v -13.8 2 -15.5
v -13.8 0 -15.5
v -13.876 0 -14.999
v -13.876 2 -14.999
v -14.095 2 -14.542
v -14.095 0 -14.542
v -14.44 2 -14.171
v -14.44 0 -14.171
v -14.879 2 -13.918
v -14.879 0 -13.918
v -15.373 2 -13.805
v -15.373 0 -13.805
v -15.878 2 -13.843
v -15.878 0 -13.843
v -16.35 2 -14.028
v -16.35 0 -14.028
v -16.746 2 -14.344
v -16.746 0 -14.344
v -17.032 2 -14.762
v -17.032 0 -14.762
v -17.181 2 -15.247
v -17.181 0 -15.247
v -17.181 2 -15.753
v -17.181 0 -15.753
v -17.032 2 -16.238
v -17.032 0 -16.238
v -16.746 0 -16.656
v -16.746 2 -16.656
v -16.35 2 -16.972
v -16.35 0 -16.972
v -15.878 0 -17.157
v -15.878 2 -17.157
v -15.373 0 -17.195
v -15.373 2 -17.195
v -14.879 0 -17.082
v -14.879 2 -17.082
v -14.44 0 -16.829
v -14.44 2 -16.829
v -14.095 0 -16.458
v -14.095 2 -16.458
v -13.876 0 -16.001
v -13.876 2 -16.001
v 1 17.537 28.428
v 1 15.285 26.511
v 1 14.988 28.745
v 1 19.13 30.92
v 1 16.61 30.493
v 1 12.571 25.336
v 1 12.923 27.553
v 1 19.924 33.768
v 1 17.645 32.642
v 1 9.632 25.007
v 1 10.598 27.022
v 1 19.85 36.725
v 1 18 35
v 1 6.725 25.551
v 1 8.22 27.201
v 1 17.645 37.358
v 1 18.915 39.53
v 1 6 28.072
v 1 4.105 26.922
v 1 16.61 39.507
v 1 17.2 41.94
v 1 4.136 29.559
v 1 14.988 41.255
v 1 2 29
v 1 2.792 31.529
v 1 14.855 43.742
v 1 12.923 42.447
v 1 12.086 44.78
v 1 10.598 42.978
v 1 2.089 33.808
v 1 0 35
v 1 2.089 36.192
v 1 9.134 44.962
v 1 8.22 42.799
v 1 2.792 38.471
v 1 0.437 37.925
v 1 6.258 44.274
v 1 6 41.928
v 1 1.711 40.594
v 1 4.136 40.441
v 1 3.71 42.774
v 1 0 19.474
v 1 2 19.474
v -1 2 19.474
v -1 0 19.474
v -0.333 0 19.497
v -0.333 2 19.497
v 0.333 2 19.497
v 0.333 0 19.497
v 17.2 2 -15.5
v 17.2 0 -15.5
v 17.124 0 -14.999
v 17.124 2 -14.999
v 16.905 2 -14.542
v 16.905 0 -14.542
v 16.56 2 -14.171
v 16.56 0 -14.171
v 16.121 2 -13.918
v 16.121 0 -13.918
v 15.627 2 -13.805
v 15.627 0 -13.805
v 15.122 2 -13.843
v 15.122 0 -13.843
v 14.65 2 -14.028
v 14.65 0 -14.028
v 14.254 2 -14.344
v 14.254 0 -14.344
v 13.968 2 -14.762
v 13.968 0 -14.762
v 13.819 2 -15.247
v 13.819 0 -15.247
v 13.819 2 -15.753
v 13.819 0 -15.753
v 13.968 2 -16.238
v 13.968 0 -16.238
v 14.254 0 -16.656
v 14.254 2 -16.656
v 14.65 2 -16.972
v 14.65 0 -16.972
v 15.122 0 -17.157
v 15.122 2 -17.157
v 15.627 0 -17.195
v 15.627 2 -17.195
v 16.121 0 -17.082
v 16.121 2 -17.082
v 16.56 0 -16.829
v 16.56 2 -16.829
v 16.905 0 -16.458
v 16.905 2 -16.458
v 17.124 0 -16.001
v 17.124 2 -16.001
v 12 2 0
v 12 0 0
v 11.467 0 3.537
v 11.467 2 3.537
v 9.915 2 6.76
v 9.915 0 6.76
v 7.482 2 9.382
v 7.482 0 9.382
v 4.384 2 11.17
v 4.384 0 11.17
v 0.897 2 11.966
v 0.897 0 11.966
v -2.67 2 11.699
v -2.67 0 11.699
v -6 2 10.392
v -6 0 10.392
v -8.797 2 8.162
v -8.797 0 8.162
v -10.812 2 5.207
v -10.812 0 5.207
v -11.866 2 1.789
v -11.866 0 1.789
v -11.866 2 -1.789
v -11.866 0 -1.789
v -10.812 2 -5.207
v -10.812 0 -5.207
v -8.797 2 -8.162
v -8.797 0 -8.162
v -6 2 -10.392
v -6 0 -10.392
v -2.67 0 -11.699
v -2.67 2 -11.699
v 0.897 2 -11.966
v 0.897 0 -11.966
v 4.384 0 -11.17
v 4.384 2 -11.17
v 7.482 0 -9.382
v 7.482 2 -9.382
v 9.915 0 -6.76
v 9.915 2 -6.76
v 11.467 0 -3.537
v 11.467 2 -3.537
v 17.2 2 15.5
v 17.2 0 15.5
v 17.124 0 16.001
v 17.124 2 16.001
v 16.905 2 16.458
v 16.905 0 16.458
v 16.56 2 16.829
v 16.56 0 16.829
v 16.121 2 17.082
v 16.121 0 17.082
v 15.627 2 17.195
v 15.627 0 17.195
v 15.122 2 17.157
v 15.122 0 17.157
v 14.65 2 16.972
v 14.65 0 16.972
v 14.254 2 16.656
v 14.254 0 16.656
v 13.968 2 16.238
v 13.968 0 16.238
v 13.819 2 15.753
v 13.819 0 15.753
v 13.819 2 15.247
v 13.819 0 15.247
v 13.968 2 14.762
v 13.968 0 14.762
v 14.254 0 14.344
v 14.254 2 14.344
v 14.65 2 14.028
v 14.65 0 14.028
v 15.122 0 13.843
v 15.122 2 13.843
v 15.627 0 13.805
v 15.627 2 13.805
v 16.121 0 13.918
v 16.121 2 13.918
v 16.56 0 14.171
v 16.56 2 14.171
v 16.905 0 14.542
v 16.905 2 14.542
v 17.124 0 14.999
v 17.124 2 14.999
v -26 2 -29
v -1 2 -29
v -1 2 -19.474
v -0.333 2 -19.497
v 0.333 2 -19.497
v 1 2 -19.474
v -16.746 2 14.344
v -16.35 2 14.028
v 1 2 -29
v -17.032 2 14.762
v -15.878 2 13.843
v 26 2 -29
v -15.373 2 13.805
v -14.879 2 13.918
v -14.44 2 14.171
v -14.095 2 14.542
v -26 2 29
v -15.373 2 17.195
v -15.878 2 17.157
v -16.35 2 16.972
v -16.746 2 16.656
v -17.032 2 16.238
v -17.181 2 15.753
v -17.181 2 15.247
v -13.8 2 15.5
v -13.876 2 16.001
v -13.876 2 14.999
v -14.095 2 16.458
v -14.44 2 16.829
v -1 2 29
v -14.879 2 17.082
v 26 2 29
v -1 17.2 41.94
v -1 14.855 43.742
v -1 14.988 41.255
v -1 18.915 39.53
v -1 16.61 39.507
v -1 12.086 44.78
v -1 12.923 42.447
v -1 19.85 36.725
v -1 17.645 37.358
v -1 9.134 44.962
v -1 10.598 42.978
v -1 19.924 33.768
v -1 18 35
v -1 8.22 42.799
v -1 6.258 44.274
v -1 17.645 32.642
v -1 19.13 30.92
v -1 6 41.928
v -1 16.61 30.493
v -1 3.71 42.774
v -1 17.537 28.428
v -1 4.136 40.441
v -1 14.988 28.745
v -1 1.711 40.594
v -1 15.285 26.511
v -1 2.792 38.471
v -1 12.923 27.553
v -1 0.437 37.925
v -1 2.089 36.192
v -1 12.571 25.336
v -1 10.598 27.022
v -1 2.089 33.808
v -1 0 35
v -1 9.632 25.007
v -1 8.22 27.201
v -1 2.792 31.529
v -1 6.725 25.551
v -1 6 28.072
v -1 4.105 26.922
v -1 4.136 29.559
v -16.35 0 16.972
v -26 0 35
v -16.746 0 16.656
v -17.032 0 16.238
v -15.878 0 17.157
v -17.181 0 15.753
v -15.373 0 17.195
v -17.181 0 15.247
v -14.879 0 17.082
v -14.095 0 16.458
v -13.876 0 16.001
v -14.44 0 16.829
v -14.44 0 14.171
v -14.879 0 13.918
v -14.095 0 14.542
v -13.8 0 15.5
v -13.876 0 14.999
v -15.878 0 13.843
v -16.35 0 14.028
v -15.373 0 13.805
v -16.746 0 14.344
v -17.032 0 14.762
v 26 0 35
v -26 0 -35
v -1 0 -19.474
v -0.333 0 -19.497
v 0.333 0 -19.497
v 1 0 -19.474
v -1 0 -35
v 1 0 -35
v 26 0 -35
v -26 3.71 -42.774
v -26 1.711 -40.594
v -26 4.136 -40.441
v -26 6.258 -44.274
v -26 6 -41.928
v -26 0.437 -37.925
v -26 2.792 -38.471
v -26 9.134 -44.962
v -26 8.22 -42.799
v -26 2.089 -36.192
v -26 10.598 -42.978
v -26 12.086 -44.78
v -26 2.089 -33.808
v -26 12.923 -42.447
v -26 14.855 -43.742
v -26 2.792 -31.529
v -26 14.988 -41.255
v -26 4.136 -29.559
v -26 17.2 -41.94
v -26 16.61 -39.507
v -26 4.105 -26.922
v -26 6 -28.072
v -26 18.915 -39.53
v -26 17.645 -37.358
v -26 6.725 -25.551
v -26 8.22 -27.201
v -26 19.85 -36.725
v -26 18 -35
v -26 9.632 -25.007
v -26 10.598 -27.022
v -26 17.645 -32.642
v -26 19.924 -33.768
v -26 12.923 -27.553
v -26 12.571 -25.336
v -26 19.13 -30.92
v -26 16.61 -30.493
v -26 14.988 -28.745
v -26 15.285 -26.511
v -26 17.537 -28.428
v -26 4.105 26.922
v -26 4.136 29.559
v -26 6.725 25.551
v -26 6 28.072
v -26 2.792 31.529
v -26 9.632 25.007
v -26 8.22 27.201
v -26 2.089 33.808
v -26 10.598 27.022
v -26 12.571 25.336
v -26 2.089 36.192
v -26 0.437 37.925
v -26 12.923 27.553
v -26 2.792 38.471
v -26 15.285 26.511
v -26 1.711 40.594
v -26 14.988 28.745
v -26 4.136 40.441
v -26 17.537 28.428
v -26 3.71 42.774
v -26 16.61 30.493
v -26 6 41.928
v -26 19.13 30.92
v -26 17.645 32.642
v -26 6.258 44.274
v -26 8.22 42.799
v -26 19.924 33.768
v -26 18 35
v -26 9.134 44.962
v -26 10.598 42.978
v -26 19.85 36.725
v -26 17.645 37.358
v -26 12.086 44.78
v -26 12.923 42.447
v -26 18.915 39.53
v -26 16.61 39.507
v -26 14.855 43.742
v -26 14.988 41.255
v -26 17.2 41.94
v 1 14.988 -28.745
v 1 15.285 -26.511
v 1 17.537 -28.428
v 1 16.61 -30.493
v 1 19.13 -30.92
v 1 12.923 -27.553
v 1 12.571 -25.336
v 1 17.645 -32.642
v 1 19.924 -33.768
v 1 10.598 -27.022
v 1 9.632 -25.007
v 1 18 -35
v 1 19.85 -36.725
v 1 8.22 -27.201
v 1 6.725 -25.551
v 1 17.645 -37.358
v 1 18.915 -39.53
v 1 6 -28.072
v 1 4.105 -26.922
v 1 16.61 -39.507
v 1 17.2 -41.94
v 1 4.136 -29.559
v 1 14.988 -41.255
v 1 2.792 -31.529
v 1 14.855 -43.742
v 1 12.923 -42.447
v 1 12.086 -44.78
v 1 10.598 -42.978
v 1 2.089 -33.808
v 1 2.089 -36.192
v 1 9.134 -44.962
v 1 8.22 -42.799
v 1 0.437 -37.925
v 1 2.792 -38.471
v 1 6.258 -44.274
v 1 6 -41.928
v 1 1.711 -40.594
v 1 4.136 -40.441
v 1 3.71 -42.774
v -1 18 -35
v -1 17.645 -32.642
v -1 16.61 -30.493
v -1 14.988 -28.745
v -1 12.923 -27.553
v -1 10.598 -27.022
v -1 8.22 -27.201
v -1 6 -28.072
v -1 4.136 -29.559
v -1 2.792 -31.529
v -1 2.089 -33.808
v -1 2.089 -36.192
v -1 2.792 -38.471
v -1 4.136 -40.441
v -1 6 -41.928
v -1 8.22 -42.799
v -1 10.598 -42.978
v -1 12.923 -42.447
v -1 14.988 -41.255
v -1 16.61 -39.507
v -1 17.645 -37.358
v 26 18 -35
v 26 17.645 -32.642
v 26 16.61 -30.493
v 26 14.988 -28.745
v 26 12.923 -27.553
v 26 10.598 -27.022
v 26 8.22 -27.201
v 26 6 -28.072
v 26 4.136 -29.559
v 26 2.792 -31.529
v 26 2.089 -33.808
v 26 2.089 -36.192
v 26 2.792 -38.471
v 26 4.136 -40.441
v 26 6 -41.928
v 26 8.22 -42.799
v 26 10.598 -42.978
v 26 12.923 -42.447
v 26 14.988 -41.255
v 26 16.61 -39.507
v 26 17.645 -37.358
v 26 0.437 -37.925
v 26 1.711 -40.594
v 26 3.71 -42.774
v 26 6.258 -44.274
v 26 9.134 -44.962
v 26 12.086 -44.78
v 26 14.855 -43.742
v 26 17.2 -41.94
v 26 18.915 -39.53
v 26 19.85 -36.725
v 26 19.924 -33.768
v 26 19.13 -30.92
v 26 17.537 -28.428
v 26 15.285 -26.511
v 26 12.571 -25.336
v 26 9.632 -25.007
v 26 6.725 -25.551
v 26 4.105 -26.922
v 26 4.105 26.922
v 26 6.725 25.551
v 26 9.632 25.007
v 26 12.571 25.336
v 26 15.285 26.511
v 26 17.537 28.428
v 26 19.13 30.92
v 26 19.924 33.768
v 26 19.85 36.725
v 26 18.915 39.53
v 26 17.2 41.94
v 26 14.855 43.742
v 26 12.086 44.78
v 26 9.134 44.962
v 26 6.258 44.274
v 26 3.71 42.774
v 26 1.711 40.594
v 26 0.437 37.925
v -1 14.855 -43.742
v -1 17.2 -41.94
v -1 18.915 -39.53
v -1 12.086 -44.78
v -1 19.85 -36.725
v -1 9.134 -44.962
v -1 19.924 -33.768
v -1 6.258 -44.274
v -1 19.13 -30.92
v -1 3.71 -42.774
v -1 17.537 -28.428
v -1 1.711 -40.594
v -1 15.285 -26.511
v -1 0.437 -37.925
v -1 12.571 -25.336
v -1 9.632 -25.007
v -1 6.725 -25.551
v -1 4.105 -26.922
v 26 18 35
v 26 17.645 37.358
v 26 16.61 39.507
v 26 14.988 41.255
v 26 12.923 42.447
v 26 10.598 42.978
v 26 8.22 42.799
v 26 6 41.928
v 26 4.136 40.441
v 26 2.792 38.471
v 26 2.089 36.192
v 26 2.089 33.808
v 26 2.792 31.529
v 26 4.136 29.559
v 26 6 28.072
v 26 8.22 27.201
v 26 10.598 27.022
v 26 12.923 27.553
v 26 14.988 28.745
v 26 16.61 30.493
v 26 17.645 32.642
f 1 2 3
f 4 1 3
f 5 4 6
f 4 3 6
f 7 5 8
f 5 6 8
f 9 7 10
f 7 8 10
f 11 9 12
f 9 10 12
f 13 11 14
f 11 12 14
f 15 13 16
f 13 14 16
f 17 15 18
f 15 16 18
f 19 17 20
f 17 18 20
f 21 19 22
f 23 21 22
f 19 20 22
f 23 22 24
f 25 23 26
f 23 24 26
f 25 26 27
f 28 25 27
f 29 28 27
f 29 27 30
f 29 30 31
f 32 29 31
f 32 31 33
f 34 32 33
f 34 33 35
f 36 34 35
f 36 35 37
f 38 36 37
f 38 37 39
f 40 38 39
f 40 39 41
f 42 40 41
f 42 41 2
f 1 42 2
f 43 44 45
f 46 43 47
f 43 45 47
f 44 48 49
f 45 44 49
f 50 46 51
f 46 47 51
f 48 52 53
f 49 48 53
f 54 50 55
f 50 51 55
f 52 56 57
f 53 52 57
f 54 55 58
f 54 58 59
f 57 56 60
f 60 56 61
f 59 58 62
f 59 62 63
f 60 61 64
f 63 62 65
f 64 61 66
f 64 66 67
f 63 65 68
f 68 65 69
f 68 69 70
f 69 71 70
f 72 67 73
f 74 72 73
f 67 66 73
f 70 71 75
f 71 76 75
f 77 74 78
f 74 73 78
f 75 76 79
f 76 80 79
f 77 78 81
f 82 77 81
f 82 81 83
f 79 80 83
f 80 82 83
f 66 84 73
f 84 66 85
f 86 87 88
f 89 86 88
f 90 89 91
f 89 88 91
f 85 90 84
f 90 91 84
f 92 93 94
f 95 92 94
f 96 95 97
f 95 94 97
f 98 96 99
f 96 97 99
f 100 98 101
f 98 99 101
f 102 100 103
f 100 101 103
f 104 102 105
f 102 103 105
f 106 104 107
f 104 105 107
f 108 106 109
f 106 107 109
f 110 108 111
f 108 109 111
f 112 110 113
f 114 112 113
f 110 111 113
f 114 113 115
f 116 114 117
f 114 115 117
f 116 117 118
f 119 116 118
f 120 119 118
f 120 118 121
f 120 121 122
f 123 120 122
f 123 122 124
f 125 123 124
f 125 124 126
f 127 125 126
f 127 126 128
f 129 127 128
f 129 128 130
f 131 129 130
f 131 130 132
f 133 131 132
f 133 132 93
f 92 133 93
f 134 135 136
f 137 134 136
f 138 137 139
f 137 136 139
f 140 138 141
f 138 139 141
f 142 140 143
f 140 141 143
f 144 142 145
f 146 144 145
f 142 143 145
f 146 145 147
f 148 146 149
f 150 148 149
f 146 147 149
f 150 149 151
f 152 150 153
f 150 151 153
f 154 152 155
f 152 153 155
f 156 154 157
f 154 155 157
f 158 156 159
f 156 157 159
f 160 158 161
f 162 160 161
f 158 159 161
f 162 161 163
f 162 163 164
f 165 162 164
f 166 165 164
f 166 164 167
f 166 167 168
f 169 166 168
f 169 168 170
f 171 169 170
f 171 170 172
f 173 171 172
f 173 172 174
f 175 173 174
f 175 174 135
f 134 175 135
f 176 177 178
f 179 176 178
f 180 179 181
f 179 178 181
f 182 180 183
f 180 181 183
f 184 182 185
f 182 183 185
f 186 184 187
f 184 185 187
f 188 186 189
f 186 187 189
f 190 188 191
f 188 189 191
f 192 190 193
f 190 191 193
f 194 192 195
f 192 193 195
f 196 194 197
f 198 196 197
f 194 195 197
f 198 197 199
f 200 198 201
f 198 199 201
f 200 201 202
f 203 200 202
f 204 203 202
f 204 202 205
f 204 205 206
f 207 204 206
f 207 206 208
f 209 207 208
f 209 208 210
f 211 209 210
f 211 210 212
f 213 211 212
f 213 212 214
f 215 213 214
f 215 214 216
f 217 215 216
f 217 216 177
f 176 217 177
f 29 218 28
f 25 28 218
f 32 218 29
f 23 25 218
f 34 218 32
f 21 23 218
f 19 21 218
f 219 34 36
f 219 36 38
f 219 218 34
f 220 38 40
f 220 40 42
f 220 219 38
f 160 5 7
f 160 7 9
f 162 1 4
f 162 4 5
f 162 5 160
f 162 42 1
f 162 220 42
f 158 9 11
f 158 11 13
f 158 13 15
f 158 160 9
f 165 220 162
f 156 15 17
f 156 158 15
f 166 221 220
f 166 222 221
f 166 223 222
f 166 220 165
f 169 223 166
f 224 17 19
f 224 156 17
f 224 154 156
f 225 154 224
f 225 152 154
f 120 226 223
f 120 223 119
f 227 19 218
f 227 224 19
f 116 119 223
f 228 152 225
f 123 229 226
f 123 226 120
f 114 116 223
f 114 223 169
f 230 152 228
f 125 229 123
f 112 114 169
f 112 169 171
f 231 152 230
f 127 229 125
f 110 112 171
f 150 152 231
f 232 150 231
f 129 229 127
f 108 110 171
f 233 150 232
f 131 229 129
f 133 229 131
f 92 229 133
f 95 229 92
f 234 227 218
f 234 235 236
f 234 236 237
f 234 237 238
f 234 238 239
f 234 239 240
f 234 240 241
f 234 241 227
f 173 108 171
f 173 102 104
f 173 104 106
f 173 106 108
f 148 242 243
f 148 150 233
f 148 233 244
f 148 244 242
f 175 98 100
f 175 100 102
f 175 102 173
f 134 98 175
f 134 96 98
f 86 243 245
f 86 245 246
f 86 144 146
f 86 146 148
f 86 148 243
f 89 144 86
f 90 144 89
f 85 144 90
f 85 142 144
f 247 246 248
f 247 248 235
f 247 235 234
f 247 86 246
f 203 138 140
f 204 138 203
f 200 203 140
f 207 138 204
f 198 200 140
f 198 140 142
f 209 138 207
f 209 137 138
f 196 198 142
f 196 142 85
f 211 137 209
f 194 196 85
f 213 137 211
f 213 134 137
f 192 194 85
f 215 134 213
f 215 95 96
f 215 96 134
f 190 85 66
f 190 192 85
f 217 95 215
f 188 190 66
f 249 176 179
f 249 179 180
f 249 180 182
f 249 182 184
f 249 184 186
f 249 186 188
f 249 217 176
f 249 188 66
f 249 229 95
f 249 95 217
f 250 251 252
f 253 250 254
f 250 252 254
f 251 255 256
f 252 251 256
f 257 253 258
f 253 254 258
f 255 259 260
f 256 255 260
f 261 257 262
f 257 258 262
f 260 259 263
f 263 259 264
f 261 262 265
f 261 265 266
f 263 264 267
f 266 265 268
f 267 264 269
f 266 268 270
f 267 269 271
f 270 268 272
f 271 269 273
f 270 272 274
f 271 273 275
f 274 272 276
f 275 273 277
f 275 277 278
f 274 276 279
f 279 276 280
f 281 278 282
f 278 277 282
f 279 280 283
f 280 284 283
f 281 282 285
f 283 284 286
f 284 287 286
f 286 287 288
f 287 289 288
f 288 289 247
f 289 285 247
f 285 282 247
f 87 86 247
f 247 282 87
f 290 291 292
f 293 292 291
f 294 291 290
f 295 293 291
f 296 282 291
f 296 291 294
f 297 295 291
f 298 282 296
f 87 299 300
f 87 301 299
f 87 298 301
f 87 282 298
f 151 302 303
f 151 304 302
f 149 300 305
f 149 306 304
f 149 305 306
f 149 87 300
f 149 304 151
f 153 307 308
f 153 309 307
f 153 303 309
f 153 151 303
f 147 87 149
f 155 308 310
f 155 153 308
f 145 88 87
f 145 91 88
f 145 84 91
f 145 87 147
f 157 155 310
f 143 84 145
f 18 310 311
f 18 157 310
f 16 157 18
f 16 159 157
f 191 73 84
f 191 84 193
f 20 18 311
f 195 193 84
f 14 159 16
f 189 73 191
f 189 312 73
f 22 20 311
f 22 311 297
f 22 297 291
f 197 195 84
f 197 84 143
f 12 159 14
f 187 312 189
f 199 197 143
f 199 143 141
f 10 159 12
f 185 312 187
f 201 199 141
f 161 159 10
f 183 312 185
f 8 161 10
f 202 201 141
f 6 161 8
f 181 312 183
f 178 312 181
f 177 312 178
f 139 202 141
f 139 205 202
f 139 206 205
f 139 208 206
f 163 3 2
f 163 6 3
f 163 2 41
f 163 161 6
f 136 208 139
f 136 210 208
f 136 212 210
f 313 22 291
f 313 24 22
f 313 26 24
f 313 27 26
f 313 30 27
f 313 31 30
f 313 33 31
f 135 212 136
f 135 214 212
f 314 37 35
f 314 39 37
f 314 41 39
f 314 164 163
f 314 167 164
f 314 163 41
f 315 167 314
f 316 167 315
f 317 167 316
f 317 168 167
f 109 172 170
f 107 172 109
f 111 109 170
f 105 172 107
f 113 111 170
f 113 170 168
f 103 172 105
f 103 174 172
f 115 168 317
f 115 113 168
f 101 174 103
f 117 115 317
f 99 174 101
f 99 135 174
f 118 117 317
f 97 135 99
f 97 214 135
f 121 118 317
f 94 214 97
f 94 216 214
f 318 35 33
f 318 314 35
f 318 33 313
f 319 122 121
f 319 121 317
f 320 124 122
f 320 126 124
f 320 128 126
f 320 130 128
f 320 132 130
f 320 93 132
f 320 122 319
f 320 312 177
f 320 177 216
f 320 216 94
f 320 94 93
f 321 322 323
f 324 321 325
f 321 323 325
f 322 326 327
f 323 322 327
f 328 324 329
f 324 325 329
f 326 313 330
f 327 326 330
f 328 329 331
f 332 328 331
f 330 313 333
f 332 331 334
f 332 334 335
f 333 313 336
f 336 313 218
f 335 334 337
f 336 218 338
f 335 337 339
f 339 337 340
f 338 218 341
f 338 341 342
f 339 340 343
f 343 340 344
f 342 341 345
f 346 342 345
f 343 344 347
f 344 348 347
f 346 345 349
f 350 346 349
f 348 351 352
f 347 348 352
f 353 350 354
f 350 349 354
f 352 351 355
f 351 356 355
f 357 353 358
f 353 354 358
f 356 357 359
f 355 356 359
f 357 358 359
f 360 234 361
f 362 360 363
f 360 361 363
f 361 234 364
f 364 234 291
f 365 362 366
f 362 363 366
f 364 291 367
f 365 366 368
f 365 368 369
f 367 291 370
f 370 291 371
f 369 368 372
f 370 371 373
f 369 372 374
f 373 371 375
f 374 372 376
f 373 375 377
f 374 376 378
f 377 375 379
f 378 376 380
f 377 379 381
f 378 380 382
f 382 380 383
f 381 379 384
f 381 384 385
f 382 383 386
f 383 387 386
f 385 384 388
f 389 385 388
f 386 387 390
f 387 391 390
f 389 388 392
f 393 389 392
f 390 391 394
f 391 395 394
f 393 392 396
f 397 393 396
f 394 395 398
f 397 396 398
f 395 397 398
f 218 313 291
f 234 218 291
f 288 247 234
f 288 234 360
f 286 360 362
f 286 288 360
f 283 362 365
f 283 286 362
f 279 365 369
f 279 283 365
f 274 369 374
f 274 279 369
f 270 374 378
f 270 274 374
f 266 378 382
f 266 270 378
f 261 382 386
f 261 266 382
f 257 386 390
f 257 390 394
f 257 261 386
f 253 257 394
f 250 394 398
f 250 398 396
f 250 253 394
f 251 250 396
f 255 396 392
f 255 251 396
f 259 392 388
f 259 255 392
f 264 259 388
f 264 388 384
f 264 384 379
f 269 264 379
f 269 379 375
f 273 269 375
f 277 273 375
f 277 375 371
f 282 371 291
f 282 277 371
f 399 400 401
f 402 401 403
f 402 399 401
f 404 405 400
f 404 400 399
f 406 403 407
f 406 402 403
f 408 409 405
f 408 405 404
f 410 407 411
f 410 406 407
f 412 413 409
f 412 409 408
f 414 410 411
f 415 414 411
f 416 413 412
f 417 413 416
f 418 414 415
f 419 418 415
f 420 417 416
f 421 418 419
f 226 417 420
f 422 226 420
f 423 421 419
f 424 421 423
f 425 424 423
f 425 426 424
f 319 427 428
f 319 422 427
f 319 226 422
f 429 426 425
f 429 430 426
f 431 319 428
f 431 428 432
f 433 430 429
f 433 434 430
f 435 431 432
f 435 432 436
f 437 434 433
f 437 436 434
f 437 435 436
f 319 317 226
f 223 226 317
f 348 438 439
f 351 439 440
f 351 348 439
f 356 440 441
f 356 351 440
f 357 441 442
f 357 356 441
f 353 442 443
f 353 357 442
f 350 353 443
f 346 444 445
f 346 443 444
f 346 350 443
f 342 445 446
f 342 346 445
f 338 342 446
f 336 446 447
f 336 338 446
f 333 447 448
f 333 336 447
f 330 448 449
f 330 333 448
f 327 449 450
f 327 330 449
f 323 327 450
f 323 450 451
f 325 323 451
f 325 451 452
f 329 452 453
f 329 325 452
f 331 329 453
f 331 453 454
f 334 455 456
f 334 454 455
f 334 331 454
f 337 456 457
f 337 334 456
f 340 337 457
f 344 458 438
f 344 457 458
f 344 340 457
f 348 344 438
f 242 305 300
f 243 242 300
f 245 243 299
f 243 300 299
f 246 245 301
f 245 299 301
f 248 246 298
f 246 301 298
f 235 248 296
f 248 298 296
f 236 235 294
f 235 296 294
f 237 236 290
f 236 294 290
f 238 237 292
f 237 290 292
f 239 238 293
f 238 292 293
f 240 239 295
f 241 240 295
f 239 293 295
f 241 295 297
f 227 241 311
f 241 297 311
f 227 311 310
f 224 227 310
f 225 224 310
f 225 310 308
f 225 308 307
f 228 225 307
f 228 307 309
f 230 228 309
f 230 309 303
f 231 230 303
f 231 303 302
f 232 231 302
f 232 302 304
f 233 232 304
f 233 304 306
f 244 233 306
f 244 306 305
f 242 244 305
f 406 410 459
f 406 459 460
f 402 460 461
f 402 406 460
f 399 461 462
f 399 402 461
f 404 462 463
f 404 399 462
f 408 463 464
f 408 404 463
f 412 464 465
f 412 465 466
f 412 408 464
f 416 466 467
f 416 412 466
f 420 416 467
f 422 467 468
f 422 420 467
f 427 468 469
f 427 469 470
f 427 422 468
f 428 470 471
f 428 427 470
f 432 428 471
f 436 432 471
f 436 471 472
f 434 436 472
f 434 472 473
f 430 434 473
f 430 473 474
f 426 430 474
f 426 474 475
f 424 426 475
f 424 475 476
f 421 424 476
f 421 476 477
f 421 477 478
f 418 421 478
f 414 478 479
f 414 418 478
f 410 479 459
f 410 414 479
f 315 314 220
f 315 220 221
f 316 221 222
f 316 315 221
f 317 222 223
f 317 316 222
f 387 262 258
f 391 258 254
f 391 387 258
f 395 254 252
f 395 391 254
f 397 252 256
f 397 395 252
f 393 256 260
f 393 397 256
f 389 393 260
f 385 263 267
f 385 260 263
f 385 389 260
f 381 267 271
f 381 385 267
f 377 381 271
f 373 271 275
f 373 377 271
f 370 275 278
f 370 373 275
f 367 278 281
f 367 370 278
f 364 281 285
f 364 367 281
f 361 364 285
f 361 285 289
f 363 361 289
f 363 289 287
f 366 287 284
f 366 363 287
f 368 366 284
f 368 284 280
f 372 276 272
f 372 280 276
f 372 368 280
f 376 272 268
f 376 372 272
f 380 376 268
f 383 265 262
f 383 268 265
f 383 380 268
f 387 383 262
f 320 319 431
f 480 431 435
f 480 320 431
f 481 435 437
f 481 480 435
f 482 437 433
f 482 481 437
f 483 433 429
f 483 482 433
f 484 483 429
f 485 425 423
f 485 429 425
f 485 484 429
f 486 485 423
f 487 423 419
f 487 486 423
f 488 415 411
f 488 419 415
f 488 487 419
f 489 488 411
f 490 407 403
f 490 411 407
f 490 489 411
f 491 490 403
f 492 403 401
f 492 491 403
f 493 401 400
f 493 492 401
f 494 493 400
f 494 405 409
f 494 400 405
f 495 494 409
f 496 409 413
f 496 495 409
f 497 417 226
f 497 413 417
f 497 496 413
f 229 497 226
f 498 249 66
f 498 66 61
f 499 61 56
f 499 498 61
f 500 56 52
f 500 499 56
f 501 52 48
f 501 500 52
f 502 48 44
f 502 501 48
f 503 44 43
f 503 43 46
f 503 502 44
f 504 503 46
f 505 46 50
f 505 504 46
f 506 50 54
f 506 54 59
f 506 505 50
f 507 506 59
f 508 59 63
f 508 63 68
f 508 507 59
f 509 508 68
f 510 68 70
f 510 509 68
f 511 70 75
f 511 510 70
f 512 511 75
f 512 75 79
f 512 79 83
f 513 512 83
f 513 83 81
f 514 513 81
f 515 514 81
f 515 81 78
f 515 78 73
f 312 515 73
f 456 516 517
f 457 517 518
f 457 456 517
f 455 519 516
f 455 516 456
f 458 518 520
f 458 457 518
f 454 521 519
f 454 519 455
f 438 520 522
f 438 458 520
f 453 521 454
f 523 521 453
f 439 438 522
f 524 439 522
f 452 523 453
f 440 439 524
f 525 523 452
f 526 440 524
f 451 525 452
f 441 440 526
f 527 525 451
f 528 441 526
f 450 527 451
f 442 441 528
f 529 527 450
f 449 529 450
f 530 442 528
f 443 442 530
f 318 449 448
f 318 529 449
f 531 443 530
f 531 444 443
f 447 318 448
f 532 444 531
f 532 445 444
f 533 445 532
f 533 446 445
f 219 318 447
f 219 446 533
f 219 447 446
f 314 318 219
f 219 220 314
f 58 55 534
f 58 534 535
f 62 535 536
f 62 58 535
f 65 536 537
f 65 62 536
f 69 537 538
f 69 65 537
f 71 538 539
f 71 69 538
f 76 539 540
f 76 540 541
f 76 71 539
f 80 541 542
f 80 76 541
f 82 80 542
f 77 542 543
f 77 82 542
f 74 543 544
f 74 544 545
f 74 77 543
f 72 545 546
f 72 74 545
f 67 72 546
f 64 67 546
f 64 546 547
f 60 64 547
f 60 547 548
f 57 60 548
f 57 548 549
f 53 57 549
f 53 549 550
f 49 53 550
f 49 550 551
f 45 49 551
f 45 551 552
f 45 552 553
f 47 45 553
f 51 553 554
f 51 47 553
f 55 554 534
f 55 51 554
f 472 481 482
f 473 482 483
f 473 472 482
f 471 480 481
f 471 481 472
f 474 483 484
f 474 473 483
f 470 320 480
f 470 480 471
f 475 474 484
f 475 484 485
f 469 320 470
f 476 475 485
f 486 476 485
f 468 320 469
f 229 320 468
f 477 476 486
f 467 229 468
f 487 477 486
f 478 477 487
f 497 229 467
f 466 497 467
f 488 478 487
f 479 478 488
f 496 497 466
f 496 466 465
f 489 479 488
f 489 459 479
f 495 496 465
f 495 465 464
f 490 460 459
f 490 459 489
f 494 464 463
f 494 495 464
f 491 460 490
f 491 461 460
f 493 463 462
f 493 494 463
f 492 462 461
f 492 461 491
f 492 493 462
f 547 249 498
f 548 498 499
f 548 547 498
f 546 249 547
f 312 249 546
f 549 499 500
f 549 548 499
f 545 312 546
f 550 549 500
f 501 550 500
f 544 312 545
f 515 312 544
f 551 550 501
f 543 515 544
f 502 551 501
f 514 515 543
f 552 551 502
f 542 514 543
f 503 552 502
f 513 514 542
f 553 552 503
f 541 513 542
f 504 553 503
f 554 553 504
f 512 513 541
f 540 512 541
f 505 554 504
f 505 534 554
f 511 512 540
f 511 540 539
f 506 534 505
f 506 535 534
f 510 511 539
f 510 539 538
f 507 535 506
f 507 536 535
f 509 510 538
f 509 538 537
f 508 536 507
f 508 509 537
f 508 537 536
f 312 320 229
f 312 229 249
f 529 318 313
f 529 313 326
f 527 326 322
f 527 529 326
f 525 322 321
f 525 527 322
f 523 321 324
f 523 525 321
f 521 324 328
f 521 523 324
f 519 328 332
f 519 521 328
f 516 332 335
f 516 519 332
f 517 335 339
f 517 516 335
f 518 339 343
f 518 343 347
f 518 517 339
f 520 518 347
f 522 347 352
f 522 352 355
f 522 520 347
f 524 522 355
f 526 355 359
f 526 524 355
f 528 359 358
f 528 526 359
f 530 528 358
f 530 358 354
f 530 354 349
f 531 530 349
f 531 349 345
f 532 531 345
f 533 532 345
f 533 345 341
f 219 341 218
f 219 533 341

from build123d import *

# Parameters (mm, degrees)
F0_R     = 8
F1_DEPTH = 26
F2_R     = 12
F2_R_2   = 1.7
F3_DEPTH = 25
F5_DEPTH = 20.001


# Not quite as in the source:
# - a pattern or mirror of a feature is missing from the dataset's text; its kind, count and spacing are read off the source's solid


with BuildPart() as f1:
    # F0 (on Right) → F1 (new body, symmetric)
    with BuildSketch(Plane.YZ):
        with BuildLine():
            ThreePointArc((2, 29), (19.4868329805, 38.1622776602), (0, 35))
            Line((0, 35), (0, -35))
            ThreePointArc((0, -35), (19.4868329805, -38.1622776602), (2, -29))
            Line((2, -29), (2, 29))
        make_face()
        with Locations((10, -35)):
            Circle(F0_R, mode=Mode.SUBTRACT)
        with Locations((10, 35)):
            Circle(F0_R, mode=Mode.SUBTRACT)
    extrude(amount=F1_DEPTH, both=True)

    # F2 (on face) → F3 (cut)
    with BuildSketch(Plane.XZ):
        Circle(F2_R)
        with Locations((-15.5, 15.5)):
            Circle(F2_R_2)
        with Locations((15.5, 15.5)):
            Circle(F2_R_2)
        with Locations((15.5, -15.5)):
            Circle(F2_R_2)
        with Locations((-15.5, -15.5)):
            Circle(F2_R_2)
    extrude(amount=-F3_DEPTH, mode=Mode.SUBTRACT)

    # F4 (on face) → F5 (cut, through all)
    with BuildSketch(Plane.XZ):
        with BuildLine():
            Line((1, 19.4743420942), (1, 45))
            Line((1, 45), (-1, 45))
            Line((-1, 45), (-1, 19.4743420942))
            ThreePointArc((-1, 19.4743420942), (0, 19.5), (1, 19.4743420942))
        make_face()
    f5 = extrude(amount=-F5_DEPTH, mode=Mode.SUBTRACT)

    # F5_copies: F5 across plane
    add(f5.mirror(Plane(origin=(0, 0, 0), x_dir=(-1, 0, 0), z_dir=(0, 0, -1))), mode=Mode.SUBTRACT)


solid = f1.part
